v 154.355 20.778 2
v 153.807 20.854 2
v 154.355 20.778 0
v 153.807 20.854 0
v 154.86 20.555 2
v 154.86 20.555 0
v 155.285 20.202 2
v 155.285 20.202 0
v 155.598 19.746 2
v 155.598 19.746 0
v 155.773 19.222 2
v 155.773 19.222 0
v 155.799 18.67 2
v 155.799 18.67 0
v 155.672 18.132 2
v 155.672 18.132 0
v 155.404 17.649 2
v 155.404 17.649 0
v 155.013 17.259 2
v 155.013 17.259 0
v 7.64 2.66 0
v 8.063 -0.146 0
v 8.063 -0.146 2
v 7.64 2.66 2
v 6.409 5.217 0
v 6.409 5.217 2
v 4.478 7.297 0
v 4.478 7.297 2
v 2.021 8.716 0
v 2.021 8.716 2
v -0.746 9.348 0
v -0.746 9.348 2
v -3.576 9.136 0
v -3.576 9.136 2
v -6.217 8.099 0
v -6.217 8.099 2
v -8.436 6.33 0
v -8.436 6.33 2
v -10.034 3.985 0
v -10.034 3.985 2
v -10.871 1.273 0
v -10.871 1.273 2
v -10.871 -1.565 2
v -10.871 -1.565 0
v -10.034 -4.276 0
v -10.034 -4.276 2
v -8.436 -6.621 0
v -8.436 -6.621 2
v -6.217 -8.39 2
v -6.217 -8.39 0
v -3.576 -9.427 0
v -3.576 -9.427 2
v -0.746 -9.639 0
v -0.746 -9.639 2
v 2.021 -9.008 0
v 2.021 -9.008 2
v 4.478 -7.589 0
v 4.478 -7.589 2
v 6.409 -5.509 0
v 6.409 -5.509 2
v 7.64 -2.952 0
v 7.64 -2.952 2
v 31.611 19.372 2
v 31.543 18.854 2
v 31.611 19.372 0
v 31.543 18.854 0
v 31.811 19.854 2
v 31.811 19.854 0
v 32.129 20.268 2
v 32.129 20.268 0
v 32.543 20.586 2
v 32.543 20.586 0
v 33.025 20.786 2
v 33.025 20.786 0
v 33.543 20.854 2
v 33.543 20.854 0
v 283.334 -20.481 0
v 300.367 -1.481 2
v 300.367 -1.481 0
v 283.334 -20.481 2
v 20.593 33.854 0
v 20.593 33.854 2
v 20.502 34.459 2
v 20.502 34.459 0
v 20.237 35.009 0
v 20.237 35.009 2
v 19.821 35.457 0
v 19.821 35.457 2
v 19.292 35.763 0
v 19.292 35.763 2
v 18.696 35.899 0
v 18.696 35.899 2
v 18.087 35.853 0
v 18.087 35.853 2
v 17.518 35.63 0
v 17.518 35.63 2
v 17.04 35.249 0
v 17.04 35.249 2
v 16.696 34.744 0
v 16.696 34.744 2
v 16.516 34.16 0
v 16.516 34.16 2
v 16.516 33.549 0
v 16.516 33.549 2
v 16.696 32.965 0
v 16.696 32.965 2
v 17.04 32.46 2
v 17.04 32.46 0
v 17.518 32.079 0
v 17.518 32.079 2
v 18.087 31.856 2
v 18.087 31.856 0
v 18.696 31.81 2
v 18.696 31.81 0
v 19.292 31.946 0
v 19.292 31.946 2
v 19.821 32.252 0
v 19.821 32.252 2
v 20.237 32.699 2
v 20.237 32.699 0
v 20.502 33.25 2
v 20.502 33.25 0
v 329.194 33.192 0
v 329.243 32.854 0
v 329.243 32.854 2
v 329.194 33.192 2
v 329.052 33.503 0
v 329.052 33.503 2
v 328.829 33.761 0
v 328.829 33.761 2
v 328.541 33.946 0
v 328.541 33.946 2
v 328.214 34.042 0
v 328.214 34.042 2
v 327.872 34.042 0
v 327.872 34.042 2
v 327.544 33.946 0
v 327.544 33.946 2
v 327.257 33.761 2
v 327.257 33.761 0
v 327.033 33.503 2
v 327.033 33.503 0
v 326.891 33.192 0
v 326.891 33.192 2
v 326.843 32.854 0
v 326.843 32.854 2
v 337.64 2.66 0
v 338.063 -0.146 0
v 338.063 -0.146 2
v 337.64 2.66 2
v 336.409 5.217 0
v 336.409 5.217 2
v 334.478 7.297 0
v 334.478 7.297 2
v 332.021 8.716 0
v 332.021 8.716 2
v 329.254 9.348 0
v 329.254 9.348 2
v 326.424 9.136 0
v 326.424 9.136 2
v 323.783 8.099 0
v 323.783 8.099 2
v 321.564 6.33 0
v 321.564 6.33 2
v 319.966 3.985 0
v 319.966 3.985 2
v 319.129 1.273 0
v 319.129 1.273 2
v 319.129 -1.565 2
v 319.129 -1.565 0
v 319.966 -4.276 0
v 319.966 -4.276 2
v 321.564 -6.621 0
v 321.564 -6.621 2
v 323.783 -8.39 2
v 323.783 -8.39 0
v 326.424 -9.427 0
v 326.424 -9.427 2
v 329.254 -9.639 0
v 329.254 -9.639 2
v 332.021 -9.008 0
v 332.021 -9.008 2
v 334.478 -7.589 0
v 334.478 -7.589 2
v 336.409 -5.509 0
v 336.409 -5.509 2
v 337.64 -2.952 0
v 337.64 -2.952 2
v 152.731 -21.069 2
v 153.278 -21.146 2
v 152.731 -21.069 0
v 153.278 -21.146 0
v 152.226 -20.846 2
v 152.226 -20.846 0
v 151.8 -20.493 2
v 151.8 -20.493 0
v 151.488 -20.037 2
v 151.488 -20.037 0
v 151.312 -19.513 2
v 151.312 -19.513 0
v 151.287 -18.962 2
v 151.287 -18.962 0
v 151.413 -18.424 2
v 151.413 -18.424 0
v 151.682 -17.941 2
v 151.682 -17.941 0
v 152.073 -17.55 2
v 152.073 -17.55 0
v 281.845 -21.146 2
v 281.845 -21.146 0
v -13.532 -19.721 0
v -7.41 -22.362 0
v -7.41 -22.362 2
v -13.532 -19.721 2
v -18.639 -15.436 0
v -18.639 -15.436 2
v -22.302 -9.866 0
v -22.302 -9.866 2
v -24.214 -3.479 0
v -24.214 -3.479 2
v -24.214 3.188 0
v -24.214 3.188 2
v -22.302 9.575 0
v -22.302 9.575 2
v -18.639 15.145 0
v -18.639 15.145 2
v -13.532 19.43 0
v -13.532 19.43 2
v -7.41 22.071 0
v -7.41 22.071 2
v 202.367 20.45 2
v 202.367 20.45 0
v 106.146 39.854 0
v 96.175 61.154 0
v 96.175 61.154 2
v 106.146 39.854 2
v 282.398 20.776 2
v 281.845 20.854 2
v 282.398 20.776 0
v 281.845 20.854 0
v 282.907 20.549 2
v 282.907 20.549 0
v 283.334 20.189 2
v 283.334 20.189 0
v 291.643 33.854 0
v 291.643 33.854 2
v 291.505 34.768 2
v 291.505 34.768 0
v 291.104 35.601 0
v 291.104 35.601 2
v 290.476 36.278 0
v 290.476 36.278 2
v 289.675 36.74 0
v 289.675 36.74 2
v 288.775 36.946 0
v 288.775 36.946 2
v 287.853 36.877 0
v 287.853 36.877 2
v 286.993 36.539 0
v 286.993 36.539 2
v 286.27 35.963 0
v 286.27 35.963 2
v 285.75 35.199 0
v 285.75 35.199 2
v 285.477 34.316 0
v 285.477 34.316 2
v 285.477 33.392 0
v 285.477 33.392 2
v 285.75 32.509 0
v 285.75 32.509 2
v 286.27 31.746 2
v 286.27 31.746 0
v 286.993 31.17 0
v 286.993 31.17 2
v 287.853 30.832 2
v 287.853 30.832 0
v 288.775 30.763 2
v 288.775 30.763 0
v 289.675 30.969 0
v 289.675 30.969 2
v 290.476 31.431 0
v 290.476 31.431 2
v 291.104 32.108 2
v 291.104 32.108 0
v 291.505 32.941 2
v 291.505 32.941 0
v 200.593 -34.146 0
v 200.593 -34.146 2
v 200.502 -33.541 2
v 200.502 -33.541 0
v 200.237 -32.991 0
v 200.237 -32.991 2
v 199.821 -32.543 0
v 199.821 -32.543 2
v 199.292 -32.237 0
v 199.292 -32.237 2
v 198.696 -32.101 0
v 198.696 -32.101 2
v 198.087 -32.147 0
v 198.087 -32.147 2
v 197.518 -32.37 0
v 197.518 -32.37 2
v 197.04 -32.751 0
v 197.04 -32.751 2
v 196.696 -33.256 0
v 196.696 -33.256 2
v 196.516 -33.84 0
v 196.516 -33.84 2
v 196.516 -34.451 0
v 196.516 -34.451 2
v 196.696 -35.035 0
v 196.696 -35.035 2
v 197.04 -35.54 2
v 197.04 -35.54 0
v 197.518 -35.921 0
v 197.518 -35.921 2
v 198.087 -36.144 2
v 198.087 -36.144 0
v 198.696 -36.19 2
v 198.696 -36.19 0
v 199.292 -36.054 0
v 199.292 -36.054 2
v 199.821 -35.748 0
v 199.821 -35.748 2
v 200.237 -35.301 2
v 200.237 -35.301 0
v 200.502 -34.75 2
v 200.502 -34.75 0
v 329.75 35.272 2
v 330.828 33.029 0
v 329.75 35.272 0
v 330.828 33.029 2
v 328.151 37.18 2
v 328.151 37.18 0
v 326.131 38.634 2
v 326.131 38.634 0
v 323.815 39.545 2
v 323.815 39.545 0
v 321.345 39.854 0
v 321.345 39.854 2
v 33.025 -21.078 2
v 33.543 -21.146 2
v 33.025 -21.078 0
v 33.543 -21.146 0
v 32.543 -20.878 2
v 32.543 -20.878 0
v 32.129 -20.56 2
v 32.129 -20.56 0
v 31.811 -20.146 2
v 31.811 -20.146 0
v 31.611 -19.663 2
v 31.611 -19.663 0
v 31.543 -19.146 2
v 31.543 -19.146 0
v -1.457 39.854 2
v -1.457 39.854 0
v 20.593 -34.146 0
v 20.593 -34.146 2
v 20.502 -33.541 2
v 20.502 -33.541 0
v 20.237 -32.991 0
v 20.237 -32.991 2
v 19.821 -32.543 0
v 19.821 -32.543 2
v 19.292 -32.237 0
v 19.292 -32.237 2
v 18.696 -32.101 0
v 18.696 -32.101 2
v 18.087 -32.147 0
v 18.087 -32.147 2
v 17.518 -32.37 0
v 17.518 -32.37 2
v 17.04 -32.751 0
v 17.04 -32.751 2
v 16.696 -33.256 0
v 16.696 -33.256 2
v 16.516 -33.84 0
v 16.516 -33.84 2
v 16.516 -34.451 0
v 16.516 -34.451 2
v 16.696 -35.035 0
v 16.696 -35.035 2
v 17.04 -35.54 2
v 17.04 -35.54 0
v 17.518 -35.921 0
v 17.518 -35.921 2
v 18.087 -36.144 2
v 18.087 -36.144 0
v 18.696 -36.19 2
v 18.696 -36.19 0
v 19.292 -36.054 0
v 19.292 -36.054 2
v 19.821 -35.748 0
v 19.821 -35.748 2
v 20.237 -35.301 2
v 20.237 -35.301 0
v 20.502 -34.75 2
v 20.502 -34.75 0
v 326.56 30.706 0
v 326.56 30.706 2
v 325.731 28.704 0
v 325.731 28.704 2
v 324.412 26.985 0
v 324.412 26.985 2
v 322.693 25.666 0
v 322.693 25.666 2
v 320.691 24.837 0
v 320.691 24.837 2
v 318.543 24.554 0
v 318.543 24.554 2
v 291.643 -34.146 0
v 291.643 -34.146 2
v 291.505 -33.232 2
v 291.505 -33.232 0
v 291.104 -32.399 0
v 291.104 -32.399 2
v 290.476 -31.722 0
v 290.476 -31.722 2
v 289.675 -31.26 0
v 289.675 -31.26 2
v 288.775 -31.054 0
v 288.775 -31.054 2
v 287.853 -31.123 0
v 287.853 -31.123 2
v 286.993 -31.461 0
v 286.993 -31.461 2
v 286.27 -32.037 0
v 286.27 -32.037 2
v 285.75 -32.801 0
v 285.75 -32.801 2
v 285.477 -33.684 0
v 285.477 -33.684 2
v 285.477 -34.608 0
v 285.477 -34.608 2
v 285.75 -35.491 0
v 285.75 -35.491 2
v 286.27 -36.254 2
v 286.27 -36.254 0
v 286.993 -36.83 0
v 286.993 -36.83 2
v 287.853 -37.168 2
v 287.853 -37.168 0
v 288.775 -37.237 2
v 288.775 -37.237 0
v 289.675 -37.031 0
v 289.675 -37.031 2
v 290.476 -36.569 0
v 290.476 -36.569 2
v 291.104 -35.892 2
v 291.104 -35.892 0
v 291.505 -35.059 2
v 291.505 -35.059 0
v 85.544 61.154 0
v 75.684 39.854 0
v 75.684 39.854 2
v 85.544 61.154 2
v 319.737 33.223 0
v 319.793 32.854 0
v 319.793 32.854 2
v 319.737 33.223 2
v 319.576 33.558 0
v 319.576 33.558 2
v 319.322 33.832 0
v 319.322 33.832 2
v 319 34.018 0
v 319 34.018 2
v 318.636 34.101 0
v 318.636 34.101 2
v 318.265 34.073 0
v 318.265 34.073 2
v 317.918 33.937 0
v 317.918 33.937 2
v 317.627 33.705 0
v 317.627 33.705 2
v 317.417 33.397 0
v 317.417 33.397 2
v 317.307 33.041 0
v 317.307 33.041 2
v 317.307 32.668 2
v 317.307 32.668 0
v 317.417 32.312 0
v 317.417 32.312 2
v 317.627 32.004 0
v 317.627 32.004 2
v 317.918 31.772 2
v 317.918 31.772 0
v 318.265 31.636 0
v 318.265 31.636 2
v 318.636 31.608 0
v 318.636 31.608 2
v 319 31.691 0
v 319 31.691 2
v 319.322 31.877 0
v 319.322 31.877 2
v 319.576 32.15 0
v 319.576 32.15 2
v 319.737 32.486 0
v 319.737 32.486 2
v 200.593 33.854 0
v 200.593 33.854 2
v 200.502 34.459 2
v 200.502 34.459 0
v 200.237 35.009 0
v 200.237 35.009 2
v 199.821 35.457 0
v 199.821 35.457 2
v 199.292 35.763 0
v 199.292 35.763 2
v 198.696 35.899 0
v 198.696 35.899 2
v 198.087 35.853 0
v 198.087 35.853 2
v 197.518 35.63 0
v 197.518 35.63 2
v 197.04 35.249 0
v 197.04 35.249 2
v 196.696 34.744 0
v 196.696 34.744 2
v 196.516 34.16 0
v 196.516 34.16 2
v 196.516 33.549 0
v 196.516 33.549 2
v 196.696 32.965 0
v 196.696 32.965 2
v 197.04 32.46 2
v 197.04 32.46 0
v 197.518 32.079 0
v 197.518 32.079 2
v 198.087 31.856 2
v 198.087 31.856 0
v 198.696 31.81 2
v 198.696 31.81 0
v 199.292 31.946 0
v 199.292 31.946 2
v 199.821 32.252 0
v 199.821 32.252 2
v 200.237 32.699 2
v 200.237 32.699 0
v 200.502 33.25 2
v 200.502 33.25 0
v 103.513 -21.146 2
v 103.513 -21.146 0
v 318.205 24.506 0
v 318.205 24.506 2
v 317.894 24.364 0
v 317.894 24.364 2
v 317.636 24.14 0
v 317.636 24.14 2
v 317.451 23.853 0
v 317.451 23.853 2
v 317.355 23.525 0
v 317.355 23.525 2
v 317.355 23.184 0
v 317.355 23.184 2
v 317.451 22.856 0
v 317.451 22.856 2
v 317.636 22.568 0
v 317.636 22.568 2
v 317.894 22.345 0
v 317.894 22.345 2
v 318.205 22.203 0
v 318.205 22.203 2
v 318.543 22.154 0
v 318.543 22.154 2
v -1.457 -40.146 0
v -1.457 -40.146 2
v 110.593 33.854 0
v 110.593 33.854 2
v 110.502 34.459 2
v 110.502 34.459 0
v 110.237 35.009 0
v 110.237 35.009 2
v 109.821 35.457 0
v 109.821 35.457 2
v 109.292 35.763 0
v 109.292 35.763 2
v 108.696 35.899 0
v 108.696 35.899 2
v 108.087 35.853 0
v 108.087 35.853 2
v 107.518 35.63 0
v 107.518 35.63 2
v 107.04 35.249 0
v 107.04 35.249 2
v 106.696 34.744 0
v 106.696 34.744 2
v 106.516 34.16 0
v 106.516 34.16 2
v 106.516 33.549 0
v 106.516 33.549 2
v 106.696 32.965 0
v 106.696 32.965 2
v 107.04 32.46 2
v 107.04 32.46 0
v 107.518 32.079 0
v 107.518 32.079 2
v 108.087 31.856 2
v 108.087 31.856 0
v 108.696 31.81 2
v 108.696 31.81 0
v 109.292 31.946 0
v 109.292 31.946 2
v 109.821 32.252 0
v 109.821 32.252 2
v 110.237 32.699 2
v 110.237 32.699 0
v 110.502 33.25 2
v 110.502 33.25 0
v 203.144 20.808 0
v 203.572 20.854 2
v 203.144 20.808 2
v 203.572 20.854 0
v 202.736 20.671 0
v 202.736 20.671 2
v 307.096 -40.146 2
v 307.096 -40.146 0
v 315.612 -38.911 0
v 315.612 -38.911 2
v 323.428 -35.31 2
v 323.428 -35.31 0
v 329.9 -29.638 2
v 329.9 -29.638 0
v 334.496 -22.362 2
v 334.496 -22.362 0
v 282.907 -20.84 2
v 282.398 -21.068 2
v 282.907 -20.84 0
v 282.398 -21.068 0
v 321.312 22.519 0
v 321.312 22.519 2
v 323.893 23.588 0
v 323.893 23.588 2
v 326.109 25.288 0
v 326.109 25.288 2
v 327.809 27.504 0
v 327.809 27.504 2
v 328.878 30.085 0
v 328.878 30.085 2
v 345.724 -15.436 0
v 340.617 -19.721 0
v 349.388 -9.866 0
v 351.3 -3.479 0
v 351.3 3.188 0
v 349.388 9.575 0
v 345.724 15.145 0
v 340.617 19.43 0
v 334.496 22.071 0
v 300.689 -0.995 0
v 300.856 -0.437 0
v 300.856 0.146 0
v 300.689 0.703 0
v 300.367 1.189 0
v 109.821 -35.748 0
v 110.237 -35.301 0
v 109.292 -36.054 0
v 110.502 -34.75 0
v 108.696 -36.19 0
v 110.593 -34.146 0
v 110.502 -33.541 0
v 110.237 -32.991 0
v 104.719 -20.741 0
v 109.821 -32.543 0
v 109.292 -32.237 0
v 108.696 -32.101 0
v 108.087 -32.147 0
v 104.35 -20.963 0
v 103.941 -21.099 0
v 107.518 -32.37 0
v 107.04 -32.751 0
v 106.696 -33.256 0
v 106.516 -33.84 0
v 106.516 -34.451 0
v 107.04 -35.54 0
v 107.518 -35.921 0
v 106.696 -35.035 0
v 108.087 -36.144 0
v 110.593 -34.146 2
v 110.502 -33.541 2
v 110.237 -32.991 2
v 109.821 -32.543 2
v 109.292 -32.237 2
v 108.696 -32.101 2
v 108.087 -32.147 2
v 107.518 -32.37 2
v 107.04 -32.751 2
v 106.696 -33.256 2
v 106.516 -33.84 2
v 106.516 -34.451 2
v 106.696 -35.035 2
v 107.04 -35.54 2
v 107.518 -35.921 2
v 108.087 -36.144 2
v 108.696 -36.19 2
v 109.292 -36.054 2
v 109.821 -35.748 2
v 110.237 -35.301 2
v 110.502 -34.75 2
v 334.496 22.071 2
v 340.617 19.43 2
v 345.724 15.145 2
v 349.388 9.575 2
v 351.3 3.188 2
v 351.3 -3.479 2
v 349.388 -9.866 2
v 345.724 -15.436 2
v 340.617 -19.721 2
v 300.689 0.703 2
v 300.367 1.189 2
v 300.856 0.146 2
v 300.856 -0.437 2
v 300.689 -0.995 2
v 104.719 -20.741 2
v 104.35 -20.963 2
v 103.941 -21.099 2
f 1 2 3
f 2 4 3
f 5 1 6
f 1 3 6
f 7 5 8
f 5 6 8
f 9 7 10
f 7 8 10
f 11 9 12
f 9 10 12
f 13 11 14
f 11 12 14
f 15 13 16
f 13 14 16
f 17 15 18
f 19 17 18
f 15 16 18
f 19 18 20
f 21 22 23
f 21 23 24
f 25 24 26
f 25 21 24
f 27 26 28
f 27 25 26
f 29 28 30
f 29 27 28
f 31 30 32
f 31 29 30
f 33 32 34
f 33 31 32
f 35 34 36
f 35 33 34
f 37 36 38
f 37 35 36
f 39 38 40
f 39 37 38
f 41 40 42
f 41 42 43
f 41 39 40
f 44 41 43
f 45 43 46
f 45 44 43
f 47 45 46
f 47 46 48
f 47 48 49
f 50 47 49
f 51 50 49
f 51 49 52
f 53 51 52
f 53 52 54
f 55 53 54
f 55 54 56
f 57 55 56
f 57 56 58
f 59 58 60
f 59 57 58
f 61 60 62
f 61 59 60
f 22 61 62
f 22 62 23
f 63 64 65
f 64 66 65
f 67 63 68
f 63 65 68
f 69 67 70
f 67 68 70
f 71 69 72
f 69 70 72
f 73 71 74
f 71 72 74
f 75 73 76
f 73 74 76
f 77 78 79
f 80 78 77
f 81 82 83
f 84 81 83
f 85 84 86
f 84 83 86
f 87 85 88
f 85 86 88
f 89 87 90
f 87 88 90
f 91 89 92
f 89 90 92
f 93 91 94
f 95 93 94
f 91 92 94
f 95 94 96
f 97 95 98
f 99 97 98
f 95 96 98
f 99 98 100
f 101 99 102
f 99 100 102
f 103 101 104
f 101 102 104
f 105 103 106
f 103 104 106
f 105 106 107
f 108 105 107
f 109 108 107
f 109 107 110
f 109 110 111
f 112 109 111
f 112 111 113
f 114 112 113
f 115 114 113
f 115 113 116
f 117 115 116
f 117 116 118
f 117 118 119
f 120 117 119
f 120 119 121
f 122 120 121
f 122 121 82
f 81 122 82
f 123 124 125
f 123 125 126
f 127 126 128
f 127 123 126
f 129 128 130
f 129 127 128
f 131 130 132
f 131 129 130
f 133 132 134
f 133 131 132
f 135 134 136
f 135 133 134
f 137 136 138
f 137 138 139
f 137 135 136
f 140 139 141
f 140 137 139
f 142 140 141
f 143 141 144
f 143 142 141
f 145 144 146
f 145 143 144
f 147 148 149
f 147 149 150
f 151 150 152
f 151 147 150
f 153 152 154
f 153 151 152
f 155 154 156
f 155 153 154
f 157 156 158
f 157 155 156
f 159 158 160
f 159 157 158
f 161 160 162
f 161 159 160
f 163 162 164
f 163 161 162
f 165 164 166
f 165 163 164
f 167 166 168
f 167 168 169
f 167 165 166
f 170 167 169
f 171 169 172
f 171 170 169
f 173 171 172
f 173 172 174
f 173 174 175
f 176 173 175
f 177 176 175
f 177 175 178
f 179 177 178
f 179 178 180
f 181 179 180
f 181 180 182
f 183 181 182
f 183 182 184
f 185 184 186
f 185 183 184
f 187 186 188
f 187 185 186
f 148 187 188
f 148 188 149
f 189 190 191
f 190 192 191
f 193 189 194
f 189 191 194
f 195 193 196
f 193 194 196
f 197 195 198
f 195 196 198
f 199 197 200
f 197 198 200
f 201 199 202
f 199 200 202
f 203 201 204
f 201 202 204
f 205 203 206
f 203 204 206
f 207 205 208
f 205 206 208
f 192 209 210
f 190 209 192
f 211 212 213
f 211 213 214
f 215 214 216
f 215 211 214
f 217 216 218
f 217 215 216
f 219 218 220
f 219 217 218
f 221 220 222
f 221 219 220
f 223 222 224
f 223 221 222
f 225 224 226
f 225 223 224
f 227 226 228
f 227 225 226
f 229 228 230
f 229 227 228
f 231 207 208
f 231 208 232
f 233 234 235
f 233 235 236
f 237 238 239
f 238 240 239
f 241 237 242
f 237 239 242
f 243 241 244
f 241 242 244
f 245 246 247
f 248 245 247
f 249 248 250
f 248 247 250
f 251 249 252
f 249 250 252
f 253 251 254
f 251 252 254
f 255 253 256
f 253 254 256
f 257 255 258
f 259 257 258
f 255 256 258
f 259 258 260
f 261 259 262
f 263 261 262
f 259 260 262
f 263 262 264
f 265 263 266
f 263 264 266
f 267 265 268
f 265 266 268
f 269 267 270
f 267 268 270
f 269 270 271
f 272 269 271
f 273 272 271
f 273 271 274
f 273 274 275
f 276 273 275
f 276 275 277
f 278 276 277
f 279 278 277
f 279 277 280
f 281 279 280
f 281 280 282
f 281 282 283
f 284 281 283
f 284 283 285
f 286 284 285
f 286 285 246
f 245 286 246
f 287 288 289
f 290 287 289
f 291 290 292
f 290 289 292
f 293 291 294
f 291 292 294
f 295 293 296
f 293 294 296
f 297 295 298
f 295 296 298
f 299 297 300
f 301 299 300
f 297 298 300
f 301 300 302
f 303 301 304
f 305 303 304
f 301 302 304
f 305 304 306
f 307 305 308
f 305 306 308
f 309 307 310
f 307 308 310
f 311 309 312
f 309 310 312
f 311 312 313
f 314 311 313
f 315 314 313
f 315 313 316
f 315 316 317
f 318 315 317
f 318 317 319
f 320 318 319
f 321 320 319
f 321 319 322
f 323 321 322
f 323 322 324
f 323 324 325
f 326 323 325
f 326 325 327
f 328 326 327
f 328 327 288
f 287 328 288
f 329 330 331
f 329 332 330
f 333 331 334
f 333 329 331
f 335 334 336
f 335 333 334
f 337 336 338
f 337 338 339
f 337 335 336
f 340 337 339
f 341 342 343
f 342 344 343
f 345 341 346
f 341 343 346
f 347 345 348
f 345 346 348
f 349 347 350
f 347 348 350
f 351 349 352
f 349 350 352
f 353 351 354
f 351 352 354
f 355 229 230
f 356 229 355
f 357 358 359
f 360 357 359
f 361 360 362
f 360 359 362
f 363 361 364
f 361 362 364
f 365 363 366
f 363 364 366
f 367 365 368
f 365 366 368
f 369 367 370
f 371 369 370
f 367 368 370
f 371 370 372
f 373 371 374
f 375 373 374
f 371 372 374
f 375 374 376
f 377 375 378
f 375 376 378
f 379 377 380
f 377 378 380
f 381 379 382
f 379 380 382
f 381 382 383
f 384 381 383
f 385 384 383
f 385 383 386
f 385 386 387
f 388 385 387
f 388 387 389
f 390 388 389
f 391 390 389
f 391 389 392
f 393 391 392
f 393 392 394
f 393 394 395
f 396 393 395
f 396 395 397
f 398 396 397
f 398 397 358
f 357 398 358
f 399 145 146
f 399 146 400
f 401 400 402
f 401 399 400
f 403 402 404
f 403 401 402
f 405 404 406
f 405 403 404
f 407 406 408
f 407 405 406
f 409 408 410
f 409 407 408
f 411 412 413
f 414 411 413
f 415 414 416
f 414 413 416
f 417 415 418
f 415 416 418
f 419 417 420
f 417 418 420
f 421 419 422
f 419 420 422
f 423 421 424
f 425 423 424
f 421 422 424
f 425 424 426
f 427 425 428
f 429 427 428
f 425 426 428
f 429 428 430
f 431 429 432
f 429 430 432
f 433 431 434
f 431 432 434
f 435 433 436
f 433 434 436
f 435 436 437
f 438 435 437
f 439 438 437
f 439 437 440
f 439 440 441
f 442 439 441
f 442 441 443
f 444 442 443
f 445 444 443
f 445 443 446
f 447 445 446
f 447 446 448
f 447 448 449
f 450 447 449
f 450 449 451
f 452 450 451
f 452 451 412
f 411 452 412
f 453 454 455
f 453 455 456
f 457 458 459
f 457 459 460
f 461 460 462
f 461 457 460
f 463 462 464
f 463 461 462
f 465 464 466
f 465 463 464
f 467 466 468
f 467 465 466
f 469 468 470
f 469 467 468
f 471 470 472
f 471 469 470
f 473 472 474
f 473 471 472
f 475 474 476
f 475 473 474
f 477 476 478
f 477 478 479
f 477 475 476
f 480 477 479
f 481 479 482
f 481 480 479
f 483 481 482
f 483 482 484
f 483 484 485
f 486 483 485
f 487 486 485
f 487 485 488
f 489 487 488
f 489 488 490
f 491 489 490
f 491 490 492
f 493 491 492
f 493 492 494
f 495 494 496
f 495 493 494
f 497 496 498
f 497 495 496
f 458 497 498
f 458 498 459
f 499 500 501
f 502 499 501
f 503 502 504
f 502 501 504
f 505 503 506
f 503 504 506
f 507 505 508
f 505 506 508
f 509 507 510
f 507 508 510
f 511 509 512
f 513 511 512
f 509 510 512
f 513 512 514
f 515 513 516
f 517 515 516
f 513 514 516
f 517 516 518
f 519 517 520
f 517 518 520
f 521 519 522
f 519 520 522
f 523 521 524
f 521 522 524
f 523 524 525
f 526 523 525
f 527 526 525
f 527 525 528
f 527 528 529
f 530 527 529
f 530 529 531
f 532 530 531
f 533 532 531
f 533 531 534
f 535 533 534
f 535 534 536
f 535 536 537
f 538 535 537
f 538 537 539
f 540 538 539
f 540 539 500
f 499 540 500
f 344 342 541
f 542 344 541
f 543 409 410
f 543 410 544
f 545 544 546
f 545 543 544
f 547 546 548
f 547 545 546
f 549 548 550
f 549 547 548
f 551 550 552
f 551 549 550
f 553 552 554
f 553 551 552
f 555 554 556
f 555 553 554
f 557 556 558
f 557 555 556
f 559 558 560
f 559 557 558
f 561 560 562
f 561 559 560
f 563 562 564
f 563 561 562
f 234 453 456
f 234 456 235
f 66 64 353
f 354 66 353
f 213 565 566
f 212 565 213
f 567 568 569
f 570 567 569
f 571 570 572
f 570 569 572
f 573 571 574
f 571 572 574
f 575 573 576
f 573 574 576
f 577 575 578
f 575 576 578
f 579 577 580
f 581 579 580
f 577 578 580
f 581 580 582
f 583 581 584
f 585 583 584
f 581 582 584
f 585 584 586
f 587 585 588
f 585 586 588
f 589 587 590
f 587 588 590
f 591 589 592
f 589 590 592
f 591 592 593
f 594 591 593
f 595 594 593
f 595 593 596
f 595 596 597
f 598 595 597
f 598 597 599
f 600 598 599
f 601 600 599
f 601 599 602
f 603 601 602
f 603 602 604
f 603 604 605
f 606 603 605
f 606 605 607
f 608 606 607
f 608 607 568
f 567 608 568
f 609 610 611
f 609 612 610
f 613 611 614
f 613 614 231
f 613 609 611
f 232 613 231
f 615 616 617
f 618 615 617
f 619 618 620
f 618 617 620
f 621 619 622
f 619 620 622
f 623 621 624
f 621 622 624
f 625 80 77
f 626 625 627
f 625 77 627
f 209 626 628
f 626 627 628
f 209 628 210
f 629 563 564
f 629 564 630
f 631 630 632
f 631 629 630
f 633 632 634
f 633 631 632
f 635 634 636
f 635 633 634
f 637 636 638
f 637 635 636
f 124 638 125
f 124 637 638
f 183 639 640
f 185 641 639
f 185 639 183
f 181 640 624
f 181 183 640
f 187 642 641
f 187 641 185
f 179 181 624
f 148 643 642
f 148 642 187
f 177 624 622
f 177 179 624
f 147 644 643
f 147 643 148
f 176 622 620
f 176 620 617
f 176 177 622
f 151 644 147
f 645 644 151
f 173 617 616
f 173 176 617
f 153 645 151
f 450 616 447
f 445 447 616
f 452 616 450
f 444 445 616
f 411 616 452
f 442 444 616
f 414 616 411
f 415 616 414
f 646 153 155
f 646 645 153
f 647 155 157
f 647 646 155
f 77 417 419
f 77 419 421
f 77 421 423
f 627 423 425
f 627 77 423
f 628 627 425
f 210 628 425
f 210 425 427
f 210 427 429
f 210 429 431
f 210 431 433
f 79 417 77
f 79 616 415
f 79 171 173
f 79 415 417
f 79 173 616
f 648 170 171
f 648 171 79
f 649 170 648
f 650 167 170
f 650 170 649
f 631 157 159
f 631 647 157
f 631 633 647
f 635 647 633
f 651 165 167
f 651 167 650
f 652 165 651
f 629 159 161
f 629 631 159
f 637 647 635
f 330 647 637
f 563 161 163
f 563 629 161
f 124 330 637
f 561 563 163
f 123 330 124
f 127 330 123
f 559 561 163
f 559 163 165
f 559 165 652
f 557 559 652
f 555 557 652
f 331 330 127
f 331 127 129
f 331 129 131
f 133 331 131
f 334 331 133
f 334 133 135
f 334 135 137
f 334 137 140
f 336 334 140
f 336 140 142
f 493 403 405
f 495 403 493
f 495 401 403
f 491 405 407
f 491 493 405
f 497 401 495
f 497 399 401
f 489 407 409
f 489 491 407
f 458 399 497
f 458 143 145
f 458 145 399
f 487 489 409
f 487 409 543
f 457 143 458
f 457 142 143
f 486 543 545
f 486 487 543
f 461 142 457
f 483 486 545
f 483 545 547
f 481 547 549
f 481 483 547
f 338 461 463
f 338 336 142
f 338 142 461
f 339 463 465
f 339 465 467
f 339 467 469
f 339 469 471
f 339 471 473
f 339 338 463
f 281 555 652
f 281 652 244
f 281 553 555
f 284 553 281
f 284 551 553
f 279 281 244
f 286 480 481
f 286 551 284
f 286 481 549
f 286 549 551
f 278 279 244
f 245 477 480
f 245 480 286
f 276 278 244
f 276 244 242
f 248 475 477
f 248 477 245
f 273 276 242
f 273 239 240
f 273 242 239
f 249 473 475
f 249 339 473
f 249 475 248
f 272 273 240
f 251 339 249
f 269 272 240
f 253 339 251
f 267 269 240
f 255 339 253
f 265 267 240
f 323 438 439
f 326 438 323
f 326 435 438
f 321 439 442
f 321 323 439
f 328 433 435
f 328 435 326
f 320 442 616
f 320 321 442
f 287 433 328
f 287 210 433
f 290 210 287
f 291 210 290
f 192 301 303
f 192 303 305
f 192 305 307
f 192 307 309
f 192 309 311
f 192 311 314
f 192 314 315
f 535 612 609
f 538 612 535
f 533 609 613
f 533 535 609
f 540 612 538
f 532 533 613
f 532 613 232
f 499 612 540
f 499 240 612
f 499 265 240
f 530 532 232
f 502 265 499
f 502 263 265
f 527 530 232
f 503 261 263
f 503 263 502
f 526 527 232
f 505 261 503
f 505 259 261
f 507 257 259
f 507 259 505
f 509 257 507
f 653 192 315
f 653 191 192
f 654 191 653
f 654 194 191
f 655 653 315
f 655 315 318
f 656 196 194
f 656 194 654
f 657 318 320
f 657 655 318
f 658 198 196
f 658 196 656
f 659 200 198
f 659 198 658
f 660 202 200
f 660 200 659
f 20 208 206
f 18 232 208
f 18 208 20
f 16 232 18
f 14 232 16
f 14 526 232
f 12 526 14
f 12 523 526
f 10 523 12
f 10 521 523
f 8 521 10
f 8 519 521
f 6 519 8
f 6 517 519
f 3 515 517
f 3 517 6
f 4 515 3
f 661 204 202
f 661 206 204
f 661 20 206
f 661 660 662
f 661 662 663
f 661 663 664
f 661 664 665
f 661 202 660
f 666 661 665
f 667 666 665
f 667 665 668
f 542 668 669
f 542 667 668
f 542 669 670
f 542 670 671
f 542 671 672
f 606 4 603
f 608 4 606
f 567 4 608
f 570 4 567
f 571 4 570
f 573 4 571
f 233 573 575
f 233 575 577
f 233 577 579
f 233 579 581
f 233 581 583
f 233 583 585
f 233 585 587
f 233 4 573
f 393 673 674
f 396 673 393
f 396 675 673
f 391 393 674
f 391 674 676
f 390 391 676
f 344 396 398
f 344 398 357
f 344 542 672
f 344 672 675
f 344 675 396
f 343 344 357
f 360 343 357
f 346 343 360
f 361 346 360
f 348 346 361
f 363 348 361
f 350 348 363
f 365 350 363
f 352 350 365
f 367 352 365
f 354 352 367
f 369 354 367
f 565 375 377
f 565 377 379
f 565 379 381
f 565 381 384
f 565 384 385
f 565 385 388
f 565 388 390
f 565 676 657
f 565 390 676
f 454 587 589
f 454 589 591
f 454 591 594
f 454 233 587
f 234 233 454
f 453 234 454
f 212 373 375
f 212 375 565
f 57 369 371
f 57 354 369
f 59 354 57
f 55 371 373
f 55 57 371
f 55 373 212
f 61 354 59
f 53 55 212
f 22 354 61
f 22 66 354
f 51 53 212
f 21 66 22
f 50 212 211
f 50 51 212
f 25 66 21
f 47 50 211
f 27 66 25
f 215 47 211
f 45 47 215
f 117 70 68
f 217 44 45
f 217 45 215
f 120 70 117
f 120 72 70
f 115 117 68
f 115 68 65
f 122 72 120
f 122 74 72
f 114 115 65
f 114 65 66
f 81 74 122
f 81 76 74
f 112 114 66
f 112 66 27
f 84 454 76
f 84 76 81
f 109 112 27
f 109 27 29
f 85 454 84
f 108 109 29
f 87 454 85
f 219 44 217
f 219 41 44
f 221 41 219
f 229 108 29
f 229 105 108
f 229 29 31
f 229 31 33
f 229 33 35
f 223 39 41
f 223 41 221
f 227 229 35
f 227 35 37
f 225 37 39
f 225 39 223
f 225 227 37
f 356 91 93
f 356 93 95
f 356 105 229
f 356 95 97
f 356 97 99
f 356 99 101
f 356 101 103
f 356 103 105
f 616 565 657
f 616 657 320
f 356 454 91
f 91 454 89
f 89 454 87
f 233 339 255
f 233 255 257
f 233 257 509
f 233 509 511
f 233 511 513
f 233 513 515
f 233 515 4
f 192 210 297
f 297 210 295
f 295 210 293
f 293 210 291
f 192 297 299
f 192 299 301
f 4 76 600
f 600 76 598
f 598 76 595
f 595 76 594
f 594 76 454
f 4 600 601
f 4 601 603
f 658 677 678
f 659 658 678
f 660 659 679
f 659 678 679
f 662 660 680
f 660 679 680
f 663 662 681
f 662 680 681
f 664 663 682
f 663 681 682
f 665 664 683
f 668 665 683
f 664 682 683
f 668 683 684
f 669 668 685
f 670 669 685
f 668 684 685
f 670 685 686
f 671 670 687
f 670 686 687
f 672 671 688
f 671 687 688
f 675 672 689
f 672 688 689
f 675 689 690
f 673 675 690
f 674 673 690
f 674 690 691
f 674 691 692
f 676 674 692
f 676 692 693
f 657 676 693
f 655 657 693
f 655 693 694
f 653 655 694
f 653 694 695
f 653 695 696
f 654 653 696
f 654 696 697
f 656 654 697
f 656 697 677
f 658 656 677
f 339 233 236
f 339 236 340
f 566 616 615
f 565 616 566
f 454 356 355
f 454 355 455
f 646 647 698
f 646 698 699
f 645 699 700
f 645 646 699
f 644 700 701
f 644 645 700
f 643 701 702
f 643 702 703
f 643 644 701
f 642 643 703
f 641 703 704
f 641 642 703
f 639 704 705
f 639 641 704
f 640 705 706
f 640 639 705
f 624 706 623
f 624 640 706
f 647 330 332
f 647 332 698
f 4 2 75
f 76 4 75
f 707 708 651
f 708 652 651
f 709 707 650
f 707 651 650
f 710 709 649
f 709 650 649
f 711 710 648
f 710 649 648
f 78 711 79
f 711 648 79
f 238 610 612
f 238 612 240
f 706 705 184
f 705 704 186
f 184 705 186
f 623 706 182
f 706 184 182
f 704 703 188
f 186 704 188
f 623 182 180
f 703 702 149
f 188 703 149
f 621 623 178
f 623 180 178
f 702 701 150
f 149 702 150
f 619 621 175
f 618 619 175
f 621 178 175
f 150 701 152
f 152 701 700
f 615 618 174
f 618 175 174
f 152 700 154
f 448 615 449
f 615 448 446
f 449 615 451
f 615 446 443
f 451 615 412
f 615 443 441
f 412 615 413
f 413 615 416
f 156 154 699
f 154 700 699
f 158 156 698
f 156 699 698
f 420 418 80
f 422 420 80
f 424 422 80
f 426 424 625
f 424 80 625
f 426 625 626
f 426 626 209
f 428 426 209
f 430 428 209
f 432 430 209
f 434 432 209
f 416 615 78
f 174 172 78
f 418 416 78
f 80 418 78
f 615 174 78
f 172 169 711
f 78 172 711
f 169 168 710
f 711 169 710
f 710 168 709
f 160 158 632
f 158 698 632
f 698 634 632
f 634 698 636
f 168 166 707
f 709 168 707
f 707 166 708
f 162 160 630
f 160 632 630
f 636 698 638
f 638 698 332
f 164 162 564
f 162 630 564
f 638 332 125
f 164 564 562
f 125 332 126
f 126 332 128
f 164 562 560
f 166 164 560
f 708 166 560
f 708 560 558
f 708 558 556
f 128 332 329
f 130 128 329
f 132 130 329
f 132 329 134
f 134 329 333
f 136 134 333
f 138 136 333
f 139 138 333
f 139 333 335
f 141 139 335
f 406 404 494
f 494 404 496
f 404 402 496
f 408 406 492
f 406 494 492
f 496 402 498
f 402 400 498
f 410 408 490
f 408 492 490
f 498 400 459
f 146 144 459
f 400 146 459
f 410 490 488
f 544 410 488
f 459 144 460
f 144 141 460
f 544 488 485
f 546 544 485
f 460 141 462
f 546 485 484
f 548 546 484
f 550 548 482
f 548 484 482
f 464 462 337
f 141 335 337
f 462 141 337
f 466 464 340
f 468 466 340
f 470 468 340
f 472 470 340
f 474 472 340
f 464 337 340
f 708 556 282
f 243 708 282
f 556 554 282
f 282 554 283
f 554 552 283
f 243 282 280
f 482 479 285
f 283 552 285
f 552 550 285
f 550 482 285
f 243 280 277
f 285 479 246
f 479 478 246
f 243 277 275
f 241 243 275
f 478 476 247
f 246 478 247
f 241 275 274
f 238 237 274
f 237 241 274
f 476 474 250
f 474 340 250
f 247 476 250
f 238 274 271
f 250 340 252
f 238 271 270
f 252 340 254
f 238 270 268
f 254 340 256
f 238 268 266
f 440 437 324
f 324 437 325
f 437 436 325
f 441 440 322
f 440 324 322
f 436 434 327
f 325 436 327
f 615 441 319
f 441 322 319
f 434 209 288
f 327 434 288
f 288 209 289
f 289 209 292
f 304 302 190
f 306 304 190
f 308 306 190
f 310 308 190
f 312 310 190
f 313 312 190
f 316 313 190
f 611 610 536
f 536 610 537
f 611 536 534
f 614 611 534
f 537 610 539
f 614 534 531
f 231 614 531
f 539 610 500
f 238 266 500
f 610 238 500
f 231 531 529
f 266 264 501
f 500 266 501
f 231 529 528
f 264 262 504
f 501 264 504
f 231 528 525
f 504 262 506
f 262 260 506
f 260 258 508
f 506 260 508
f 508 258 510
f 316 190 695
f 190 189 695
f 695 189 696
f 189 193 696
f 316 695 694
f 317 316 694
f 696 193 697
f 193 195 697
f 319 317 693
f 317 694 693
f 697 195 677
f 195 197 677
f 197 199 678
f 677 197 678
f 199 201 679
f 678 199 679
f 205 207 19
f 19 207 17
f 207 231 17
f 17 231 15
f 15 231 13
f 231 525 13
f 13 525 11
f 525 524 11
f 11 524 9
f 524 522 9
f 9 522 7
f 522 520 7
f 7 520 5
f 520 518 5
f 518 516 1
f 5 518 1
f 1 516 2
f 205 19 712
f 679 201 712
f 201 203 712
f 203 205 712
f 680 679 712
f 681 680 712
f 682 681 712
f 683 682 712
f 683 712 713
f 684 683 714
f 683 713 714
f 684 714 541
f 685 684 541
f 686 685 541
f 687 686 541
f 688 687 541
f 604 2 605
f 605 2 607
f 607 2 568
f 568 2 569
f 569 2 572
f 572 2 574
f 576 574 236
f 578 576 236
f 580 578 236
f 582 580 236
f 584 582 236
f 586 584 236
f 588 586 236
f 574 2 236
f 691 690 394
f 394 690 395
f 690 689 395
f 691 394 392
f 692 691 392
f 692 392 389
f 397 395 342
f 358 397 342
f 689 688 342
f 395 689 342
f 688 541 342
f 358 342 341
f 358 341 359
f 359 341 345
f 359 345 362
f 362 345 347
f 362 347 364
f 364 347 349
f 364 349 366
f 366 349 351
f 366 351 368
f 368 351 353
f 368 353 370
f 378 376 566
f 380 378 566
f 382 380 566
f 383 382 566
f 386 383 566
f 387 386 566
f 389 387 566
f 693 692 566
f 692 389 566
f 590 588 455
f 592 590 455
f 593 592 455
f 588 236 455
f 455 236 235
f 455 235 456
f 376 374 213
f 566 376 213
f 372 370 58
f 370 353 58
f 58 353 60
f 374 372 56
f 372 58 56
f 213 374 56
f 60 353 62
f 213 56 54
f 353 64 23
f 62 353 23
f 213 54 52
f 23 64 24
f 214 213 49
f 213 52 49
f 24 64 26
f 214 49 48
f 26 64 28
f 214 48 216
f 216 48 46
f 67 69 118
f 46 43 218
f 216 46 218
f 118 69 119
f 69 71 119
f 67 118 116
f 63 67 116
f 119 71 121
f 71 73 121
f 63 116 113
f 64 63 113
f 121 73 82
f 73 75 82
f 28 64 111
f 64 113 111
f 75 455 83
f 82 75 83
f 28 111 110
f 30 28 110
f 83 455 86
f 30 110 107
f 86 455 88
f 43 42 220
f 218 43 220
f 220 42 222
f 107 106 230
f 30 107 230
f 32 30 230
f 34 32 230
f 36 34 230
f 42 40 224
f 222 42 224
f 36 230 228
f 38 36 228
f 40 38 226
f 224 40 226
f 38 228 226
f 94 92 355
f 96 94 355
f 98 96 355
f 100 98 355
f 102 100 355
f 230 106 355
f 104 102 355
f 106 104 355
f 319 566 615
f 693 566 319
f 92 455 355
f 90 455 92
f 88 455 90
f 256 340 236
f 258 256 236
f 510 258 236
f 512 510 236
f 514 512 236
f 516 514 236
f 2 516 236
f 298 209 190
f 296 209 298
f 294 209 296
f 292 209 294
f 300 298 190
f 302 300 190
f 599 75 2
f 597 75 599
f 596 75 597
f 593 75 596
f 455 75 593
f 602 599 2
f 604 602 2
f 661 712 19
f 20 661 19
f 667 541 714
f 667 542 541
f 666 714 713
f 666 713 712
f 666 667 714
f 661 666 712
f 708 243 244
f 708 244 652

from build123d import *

# Parameters (mm, degrees)
SKETCH_1_R          = 9.52
SKETCH_1_R_2        = 1.25
EXTRUDE_1_DEPTH     = 2
SKETCH_2_R          = 2.05
SKETCH_2_R_2        = 3.1
CUT_EXTRUDE_1_DEPTH = 4
FILLET_1_R          = 2
FILLET_3_R          = 30
FILLET_6_R          = 10


with BuildPart() as part:
    # 草图1 → 凸台-拉伸1 (new body)
    with BuildSketch(Plane.XY):
        with BuildLine():
            Line((328.542857143, -40.145714286), (-1.457142857, -40.145714286))
            Line((-1.457142857, -40.145714286), (-7.409980895, -22.36200829))
            ThreePointArc((-7.409980895, -22.36200829), (-24.457142857, -0.145714286), (-7.409980895, 22.070579719))
            Line((-7.409980895, 22.070579719), (-1.457142857, 39.854285714))
            Line((-1.457142857, 39.854285714), (75.684411109, 39.854285714))
            Line((75.684411109, 39.854285714), (85.544413109, 61.154285714))
            Line((85.544413109, 61.154285714), (96.174870529, 61.154285714))
            Line((96.174870529, 61.154285714), (106.145912956, 39.854285714))
            Line((106.145912956, 39.854285714), (321.071621128, 39.854285714))
            Line((321.071621128, 39.854285714), (328.542857143, 39.854285714))
            Line((328.542857143, 39.854285714), (334.49569518, 22.070579719))
            ThreePointArc((334.49569518, 22.070579719), (351.542857143, -0.145714286), (334.49569518, -22.36200829))
            Line((334.49569518, -22.36200829), (328.542857143, -40.145714286))
        make_face()
        with Locations((-1.457142857, -0.145714286)):
            Circle(SKETCH_1_R, mode=Mode.SUBTRACT)
        with Locations((328.542857143, -0.145714286)):
            Circle(SKETCH_1_R, mode=Mode.SUBTRACT)
        with Locations((318.542857143, 32.854285714)):
            Circle(SKETCH_1_R_2, mode=Mode.SUBTRACT)
        with BuildLine():
            ThreePointArc((318.542857143, 22.154285714), (326.108899702, 25.288243156), (329.242857143, 32.854285714))
            ThreePointArc((329.242857143, 32.854285714), (328.042857143, 34.054285714), (326.842857143, 32.854285714))
            ThreePointArc((326.842857143, 32.854285714), (324.411843427, 26.98529943), (318.542857143, 24.554285714))
            ThreePointArc((318.542857143, 24.554285714), (317.342857143, 23.354285714), (318.542857143, 22.154285714))
        make_face(mode=Mode.SUBTRACT)
    extrude(amount=EXTRUDE_1_DEPTH)

    # 草图2 → 切除-拉伸1 (cut)
    with BuildSketch(Plane.XY.offset(2)):
        with Locations((108.542857143, 33.854285714)):
            Circle(SKETCH_2_R)
        with Locations((198.542857143, 33.854285714)):
            Circle(SKETCH_2_R)
        with Locations((108.542857143, -34.145714286)):
            Circle(SKETCH_2_R)
        with Locations((198.542857143, -34.145714286)):
            Circle(SKETCH_2_R)
        with Locations((18.542857143, -34.145714286)):
            Circle(SKETCH_2_R)
        with Locations((18.542857143, 33.854285714)):
            Circle(SKETCH_2_R)
        with Locations((288.542857143, 33.854285714)):
            Circle(SKETCH_2_R_2)
        with Locations((288.542857143, -34.145714286)):
            Circle(SKETCH_2_R_2)
        Polygon((31.542857143, -21.145714286), (104.183898028, -21.145714286), (159.772133322, 20.854285714), (31.542857143, 20.854285714), align=None)
        Polygon((147.313580964, -21.145714286), (202.901816258, 20.854285714), (282.737923896, 20.854285714), (301.563806249, -0.145714286), (282.737923896, -21.145714286), align=None)
    extrude(amount=-CUT_EXTRUDE_1_DEPTH, mode=Mode.SUBTRACT)

    # 圆角1
    fillet_1_edges = [part.edges().sort_by_distance(p)[0] for p in [
        (282.737923896, -21.145714286, 1),
        (147.313580964, -21.145714286, 1),
        (202.901816258, 20.854285714, 1),
        (282.737923896, 20.854285714, 1),
        (301.563806249, -0.145714286, 1),
        (31.542857143, -21.145714286, 1),
        (31.542857143, 20.854285714, 1),
        (159.772133322, 20.854285714, 1),
        (104.183898028, -21.145714286, 1),
    ]]
    fillet(fillet_1_edges, radius=FILLET_1_R)

    # 圆角3
    # the kernel refuses this fillet: 30 mm, written as the material it takes off along each edge
    with BuildSketch(Plane(origin=(328.542857143, -40.145714286, -53.618003483), x_dir=(0.3174242162824087, 0.9482836426499714, 0), z_dir=(0, 0, 1))) as fillet_3_piece_1:
        with BuildLine():
            CenterArc((21.640648186, 29.86075675), FILLET_3_R, 198.507223716, 65.970321092)
            Line((-6.807861094, 20.338030262), (-7.376831279, 20.147575732))
            Line((-7.376831279, 20.147575732), (-0.568970186, -0.19045453))
            Line((-0.568970186, -0.19045453), (0, -0.6))
            ThreePointArc((0, -0.6), (9.376786225, -0.6), (18.695830935, -0.597215135))
            Line((18.695830935, -0.597215135), (18.75357245, 0))
        make_face()
    extrude(amount=109.236006966, mode=Mode.SUBTRACT)

    # 圆角6
    fillet_6_edges = [part.edges().sort_by_distance(p)[0] for p in [
        (328.542857143, 39.854285714, 1),
    ]]
    fillet(fillet_6_edges, radius=FILLET_6_R)


solid = part.part
